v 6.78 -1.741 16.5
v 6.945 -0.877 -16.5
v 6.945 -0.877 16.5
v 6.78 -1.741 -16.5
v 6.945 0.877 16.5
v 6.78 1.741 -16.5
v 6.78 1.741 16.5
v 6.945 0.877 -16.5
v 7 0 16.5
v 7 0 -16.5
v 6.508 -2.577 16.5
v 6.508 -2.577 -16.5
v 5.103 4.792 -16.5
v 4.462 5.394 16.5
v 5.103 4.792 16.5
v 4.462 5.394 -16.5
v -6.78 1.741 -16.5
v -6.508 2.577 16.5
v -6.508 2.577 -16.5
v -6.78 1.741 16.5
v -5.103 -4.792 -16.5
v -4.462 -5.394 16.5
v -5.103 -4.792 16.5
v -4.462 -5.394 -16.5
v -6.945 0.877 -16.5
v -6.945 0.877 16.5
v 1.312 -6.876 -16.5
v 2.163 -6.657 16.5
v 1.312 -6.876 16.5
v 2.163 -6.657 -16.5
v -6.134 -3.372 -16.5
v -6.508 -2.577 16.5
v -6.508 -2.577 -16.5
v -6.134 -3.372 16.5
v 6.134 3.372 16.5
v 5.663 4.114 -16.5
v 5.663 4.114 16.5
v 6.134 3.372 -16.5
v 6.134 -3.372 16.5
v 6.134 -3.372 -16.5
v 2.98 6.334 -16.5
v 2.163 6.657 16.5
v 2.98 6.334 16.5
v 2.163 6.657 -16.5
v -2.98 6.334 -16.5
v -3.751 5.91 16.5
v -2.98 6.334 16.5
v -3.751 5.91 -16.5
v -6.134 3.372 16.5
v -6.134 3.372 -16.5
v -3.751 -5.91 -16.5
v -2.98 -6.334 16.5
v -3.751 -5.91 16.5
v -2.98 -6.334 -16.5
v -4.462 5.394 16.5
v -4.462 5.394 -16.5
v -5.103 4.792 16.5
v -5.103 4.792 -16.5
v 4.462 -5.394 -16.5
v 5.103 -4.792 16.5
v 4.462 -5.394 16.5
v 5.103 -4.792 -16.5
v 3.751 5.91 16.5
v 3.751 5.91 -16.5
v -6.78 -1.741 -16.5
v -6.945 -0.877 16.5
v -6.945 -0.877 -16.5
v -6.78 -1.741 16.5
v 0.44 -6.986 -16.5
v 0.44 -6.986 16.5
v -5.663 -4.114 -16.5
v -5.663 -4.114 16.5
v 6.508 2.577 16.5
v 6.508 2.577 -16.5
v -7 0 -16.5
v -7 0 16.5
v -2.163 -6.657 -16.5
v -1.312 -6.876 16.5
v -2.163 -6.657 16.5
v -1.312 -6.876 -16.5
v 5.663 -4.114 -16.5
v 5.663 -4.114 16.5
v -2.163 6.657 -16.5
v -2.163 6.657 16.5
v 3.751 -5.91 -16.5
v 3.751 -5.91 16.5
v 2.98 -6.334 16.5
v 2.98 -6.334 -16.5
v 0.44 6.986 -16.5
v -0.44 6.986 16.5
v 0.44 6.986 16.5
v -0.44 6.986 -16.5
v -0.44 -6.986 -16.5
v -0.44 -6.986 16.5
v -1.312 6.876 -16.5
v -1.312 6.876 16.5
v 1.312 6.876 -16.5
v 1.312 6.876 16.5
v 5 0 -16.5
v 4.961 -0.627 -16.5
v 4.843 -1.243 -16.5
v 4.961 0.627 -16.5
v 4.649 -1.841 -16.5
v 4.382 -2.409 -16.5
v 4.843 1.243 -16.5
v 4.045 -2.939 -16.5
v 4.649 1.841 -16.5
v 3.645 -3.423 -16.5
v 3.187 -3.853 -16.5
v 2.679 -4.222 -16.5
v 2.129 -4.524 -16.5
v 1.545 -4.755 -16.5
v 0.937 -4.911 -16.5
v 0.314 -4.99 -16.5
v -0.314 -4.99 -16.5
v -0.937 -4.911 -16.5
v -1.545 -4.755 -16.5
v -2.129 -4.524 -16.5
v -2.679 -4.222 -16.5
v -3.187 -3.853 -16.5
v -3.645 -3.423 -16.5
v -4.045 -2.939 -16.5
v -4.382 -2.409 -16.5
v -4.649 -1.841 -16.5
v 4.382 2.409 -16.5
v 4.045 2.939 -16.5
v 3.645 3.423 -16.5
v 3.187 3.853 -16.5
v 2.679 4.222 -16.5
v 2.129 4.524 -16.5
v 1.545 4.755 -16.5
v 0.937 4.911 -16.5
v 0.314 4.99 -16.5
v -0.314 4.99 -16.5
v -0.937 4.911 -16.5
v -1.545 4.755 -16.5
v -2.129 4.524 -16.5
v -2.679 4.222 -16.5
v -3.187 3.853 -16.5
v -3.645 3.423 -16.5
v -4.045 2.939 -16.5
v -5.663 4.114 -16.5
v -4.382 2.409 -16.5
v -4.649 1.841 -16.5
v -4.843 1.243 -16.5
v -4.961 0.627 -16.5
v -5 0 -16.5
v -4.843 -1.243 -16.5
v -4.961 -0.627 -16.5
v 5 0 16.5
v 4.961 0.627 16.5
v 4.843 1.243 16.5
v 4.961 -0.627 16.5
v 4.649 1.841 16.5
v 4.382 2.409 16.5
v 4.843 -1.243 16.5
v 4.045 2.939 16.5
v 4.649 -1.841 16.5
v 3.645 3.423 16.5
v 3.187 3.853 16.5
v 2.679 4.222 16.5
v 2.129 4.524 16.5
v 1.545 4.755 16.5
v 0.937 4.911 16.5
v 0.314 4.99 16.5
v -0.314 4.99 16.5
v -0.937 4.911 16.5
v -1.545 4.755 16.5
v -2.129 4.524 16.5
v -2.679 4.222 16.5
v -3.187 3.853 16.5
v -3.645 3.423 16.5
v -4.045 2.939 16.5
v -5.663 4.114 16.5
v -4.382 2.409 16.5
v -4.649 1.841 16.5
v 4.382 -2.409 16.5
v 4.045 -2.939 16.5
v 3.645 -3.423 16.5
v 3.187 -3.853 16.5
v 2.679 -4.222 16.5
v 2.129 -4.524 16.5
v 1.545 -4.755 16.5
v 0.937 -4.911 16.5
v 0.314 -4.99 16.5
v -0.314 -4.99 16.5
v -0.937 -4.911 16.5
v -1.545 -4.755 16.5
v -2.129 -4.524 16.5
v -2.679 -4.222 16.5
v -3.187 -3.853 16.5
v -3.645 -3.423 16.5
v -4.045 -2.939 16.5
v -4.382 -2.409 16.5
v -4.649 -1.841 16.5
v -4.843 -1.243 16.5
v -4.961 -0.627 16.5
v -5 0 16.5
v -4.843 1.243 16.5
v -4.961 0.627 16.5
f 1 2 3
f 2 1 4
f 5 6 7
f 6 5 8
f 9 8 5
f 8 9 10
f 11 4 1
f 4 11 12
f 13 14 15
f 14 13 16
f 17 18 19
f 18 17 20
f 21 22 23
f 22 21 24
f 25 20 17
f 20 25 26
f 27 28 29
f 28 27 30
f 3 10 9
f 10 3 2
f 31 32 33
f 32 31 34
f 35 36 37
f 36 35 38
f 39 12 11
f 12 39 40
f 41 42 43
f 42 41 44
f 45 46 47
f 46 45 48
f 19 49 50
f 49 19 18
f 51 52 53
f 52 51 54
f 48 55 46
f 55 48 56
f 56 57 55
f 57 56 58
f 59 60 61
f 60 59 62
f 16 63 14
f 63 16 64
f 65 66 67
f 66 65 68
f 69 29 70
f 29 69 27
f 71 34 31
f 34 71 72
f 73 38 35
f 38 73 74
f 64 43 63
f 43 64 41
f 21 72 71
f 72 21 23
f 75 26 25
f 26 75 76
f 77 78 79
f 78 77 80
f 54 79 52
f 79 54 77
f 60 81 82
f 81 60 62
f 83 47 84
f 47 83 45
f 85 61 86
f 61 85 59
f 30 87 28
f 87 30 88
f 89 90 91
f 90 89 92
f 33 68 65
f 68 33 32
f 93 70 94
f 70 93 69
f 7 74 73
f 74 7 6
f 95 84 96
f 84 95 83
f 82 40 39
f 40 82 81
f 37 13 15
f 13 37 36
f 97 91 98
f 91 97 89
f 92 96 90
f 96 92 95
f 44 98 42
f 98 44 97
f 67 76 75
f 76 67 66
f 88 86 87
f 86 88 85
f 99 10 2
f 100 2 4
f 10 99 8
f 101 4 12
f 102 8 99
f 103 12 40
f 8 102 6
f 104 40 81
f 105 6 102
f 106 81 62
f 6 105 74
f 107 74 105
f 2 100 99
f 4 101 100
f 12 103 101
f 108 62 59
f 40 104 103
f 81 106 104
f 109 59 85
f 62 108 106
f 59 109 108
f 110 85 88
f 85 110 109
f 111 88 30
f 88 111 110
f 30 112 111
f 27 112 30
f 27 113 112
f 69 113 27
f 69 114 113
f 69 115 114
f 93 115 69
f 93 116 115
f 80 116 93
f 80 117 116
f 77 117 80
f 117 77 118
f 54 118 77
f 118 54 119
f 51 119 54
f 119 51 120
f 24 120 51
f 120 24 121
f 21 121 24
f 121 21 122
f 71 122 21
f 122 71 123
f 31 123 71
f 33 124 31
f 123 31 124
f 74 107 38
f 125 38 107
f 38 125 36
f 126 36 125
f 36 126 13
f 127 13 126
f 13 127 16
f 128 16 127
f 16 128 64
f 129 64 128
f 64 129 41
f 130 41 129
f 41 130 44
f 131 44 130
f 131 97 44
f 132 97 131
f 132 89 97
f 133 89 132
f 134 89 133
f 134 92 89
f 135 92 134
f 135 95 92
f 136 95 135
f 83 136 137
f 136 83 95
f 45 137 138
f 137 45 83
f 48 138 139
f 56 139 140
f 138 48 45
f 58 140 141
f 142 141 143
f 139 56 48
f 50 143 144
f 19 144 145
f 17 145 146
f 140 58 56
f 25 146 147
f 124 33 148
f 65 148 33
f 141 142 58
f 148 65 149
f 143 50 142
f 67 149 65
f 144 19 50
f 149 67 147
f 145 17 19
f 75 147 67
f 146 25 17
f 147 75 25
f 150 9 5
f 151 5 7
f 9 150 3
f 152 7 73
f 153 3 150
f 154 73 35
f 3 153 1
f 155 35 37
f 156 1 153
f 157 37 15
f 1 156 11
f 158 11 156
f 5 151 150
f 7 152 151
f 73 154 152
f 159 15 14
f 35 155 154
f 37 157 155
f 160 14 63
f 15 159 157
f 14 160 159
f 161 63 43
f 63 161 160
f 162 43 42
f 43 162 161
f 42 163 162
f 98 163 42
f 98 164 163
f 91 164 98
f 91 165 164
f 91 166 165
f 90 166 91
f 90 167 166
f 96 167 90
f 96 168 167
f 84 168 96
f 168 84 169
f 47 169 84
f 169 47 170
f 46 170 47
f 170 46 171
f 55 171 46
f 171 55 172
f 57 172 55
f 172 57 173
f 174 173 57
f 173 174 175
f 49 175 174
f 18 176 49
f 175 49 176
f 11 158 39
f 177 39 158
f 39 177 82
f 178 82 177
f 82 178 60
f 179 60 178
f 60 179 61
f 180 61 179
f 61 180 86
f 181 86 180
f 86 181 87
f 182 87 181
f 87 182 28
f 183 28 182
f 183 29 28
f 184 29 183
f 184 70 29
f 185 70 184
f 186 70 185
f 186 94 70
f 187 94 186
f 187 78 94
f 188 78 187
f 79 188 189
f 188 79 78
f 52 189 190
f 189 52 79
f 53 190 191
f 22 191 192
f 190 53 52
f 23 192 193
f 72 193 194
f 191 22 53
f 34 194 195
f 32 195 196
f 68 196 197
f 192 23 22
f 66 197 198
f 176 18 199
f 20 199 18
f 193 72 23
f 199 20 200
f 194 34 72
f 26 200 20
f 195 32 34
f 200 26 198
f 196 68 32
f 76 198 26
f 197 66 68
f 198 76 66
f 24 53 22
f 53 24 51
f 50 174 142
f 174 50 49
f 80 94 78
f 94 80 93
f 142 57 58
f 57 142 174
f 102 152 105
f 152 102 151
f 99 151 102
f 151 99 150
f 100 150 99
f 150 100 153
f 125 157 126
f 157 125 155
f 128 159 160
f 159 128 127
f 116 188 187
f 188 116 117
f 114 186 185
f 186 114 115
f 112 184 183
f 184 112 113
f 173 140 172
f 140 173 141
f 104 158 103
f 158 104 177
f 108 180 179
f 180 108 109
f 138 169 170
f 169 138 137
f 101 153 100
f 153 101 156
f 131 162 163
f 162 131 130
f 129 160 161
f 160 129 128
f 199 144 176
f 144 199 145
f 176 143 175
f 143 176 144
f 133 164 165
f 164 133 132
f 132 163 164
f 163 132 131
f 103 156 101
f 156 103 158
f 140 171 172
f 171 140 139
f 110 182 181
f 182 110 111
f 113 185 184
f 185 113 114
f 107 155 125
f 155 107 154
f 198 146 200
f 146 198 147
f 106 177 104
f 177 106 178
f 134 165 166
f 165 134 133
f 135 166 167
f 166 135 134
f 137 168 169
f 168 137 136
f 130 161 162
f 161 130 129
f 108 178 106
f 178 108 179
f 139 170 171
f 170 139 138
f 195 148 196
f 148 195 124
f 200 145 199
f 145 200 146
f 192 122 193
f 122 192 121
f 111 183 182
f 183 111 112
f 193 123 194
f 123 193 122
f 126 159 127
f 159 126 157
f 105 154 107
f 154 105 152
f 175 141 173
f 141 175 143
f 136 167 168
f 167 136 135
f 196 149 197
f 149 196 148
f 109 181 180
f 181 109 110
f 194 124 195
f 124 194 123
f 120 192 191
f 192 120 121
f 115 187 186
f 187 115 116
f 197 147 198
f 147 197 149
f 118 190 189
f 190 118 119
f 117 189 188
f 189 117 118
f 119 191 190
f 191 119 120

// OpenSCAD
$fn = 50;


difference() {
	union() {
		translate(v = [0, 0, -16.5000000000]) {
			cylinder(h = 33, r = 7.0000000000);
		}
	}
	union() {
		translate(v = [0, 0, -100.0000000000]) {
			cylinder(h = 200, r = 5.0000000000);
		}
	}
}
